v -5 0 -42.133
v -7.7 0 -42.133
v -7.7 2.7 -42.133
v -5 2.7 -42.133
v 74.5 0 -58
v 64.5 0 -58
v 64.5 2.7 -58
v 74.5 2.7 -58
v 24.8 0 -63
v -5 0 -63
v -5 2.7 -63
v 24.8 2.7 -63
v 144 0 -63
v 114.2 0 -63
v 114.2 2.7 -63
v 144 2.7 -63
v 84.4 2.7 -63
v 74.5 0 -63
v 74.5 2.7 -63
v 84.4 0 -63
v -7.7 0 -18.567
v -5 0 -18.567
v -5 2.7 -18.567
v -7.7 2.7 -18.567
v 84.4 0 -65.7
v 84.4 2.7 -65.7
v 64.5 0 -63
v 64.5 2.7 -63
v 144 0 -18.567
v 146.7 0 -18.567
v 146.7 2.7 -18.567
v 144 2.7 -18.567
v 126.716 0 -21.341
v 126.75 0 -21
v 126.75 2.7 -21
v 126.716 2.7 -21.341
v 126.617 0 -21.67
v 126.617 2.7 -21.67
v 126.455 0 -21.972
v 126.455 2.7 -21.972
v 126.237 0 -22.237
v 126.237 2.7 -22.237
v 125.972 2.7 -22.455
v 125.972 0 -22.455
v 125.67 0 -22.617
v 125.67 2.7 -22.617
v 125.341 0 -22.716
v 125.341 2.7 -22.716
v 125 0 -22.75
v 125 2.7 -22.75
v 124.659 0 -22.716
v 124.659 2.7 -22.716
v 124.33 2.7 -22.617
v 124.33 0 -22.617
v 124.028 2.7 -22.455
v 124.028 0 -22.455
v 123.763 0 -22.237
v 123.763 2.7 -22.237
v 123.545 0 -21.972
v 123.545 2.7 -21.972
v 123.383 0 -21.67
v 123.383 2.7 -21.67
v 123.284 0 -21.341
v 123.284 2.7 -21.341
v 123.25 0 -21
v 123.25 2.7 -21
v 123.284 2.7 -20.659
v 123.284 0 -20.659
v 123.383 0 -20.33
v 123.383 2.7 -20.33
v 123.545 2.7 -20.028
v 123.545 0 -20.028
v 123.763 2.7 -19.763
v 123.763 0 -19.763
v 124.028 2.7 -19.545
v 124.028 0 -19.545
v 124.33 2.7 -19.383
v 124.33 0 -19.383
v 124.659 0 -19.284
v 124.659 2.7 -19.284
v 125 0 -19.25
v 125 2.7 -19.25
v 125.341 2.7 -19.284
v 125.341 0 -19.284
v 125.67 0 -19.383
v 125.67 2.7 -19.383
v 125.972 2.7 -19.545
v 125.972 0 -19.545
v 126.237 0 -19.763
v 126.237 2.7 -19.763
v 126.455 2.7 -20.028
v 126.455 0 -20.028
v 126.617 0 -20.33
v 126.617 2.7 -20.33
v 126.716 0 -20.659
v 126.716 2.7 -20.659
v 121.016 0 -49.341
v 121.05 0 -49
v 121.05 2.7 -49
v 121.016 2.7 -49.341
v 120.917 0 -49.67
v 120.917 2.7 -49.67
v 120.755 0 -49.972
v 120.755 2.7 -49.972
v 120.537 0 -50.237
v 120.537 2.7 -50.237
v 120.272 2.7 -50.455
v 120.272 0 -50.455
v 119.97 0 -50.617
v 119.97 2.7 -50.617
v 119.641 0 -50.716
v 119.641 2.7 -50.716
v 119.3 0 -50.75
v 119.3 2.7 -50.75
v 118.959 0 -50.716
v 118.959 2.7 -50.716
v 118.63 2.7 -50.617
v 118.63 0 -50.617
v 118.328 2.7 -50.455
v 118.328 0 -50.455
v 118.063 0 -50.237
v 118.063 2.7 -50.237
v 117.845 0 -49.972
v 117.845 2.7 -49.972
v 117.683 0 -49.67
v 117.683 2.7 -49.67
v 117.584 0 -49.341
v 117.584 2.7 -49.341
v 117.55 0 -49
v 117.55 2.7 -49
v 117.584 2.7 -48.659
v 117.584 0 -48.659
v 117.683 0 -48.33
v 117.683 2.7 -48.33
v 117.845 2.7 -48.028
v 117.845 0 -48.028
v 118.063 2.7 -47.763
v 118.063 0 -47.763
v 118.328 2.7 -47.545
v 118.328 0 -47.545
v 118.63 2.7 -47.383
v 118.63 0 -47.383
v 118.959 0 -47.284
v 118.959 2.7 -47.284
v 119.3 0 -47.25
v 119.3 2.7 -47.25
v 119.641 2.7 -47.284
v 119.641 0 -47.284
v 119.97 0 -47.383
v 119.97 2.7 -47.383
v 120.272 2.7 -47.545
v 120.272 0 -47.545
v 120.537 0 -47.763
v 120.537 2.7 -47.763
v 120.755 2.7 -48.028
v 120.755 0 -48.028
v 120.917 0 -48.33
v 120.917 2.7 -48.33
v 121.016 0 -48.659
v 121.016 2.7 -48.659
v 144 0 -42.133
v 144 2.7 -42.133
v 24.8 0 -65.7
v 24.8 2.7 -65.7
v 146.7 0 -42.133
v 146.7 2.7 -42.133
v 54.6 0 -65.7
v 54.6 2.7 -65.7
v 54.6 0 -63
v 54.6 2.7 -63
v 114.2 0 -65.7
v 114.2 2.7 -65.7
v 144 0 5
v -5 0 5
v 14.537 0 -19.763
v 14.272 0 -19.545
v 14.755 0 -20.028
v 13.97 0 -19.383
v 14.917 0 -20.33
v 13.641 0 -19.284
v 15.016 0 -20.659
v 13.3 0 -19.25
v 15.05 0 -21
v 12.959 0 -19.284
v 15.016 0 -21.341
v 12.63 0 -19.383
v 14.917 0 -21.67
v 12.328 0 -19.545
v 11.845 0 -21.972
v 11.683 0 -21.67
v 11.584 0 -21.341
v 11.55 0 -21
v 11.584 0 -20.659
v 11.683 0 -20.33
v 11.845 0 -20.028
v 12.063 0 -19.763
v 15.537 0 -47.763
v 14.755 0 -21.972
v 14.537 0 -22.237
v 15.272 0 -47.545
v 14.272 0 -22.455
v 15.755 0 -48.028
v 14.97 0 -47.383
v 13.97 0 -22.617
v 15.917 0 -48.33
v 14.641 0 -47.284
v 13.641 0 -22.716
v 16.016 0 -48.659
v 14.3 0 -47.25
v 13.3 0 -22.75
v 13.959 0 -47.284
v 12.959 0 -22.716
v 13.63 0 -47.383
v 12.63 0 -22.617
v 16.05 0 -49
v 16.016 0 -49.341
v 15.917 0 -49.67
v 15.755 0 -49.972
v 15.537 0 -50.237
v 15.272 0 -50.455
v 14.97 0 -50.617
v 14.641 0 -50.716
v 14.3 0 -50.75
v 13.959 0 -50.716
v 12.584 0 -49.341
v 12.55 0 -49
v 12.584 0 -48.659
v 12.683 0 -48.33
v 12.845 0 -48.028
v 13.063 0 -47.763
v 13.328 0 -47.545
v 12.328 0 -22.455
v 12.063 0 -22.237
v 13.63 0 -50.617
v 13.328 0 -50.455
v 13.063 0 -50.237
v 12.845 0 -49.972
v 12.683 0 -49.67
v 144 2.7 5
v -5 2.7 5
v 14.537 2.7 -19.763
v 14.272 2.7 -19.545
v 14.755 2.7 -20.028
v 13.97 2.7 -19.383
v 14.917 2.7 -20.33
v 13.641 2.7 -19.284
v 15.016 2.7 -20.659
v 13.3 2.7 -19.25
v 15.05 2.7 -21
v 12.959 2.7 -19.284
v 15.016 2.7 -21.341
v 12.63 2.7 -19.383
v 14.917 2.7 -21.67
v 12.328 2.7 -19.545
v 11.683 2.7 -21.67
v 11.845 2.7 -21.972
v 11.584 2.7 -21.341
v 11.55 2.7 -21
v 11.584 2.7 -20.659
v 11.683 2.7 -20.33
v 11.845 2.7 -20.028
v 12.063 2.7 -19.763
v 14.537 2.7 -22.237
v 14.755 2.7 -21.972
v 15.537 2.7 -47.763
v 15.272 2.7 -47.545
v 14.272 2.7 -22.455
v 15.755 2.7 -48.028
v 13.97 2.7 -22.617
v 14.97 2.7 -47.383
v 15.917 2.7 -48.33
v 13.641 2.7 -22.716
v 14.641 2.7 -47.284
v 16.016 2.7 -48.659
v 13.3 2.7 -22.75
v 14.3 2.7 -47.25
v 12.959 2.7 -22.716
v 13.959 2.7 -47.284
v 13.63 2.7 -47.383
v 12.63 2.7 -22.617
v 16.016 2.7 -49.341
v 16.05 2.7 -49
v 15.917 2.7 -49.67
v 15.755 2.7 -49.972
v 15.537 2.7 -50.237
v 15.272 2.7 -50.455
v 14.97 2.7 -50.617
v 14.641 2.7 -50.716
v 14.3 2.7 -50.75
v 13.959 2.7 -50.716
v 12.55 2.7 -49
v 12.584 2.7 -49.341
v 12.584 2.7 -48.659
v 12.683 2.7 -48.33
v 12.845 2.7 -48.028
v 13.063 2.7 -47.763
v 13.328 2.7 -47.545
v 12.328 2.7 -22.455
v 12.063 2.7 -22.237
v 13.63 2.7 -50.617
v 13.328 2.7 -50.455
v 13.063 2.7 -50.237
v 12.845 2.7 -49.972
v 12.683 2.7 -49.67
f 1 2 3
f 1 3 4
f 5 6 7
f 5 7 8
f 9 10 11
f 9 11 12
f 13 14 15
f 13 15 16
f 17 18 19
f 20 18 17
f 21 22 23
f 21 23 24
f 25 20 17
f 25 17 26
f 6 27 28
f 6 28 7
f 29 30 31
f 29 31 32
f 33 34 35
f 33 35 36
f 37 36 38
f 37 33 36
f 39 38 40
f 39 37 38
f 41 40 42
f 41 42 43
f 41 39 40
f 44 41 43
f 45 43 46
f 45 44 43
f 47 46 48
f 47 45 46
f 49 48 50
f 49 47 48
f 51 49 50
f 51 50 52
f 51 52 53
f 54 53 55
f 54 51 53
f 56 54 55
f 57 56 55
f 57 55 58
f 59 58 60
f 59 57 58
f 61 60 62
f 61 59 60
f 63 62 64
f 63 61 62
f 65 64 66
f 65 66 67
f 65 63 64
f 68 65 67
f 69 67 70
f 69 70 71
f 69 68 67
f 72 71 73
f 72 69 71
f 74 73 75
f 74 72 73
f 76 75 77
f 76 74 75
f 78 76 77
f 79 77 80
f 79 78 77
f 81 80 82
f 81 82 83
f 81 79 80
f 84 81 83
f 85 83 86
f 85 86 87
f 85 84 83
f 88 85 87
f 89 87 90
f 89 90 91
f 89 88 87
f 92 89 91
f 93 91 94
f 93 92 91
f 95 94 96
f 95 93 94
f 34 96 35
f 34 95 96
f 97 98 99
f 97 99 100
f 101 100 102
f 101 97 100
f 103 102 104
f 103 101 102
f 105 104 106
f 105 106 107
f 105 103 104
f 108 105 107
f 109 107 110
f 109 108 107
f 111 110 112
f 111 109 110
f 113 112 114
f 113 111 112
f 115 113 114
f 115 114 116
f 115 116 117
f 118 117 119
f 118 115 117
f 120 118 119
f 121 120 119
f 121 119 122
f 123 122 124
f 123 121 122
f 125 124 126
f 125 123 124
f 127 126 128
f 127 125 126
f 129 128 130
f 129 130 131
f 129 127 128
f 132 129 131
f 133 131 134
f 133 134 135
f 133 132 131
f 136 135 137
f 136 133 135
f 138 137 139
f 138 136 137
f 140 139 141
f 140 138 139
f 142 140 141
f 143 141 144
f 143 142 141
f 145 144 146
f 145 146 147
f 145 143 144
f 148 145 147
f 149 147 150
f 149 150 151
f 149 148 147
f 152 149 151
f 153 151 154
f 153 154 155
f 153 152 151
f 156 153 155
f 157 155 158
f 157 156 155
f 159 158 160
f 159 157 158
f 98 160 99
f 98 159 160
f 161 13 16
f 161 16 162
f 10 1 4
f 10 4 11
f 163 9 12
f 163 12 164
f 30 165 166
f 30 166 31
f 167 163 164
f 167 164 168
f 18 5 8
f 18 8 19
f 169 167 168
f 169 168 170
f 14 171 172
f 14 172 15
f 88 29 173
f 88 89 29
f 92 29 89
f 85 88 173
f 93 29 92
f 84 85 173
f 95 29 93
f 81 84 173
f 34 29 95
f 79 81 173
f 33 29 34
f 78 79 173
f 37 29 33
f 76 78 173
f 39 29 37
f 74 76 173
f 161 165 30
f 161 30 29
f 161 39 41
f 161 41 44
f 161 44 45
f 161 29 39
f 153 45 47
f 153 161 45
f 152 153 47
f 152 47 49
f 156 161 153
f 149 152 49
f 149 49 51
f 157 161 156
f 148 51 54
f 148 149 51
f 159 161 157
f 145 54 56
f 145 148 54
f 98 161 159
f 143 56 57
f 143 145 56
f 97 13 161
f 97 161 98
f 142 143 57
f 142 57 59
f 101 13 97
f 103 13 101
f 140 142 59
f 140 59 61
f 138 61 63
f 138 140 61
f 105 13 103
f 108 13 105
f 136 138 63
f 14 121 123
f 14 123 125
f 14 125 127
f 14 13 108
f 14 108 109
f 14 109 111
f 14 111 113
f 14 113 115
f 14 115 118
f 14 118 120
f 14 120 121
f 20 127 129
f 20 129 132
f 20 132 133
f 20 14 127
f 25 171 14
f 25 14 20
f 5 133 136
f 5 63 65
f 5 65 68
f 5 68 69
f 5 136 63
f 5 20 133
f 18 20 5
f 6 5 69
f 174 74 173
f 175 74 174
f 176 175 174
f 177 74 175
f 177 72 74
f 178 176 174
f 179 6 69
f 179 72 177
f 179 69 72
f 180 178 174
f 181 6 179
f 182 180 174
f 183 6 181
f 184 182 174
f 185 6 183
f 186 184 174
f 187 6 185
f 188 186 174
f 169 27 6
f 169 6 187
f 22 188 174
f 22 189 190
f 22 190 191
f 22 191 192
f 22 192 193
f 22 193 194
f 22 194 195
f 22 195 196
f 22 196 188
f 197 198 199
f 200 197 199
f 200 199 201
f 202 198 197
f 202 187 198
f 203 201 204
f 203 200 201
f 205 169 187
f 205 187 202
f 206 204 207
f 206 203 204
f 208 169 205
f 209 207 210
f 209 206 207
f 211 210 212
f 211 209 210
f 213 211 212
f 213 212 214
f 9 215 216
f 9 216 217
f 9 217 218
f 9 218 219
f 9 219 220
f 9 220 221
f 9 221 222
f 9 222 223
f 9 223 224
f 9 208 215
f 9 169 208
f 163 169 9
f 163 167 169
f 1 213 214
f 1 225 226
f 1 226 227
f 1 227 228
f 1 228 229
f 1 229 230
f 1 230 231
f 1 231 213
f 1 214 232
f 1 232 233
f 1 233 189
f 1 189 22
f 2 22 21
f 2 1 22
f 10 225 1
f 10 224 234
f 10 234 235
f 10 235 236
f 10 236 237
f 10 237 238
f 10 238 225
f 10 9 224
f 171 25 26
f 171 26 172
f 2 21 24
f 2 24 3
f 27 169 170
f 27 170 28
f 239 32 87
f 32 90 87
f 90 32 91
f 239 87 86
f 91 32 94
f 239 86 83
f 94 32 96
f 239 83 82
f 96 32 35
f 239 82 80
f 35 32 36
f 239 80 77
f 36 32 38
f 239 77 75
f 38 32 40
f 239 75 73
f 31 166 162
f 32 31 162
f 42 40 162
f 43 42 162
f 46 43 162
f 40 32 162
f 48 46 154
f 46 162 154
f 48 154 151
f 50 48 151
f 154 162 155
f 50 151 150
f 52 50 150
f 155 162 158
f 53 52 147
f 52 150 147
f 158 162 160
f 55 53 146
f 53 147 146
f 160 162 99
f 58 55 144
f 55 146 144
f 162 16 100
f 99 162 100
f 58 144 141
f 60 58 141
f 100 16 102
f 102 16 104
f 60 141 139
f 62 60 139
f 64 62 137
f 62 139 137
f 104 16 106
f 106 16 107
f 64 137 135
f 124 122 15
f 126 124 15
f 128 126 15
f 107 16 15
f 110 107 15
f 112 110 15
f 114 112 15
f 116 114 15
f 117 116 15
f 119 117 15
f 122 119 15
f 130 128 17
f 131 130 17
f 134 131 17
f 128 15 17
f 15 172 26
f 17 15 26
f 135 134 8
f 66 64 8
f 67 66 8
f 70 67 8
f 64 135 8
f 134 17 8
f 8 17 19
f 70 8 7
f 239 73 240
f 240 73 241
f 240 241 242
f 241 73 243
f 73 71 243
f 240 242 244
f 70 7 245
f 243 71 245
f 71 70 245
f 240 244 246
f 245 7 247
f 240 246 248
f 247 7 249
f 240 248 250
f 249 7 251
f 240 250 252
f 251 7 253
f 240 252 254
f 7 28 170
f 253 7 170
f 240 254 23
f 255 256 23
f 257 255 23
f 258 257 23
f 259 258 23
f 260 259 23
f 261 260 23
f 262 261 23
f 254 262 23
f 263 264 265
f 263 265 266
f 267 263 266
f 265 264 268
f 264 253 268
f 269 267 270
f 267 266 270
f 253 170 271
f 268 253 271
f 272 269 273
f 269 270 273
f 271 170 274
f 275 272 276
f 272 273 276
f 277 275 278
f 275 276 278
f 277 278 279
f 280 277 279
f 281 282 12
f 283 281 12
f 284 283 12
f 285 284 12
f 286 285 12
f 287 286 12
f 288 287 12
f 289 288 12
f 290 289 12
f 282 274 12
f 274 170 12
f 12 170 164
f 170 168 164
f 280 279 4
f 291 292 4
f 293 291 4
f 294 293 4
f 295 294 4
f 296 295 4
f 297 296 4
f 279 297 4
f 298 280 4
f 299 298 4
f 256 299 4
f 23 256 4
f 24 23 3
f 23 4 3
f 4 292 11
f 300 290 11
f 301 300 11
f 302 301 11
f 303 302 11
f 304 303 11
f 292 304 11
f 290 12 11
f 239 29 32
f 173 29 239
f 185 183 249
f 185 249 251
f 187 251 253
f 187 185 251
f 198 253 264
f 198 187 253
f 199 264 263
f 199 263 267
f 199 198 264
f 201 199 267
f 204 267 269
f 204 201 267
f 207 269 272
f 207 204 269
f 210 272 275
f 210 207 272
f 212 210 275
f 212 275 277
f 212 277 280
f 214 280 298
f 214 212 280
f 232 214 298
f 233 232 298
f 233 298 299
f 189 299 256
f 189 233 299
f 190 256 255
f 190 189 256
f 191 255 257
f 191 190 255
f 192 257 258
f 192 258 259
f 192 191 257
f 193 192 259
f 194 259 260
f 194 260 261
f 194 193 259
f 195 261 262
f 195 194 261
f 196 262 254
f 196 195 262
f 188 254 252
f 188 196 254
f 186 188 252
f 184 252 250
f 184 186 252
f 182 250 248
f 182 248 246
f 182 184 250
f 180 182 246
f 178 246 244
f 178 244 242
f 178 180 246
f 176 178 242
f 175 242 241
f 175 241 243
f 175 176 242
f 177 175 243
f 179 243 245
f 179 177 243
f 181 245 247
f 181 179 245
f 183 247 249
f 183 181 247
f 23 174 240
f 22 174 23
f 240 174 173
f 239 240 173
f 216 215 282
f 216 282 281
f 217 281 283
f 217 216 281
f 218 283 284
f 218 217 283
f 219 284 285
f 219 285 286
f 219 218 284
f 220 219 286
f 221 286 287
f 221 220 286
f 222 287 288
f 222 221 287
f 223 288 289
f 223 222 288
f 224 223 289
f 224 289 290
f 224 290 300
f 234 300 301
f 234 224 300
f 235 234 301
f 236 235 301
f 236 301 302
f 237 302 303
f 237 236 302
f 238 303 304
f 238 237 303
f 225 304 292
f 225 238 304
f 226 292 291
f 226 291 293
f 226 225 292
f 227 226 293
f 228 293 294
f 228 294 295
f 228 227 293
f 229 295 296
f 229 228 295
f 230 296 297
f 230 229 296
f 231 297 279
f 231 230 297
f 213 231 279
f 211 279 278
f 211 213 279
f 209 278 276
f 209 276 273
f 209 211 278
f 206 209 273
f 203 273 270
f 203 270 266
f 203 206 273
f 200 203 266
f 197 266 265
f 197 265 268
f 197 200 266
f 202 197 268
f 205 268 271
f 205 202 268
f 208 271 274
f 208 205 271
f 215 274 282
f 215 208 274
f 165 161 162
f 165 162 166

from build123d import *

# Parameters (mm, degrees)
SKETCH1_R           = 1.75
BOSS_EXTRUDE1_DEPTH = 2.7


with BuildPart() as part:
    # Sketch1 → Boss-Extrude1 (new body)
    with BuildSketch(Plane(origin=(0, 0, 0), x_dir=(1, 0, 0), z_dir=(0, 1, 0))):
        Polygon((64.5, 63), (64.5, 58), (74.5, 58), (74.5, 63), (84.4, 63), (84.4, 65.7), (114.2, 65.7), (114.2, 63), (144, 63), (144, 42.133333333), (146.7, 42.133333333), (146.7, 18.566666667), (144, 18.566666667), (144, -5), (115.82, -5), (84.94, -5), (74.5, -5), (64.5, -5), (54.06, -5), (23.18, -5), (-5, -5), (-5, 18.566666667), (-7.7, 18.566666667), (-7.7, 42.133333333), (-5, 42.133333333), (-5, 63), (24.8, 63), (24.8, 65.7), (54.6, 65.7), (54.6, 63), align=None)
        with Locations((13.3, 21)):
            Circle(SKETCH1_R, mode=Mode.SUBTRACT)
        with Locations((14.3, 49)):
            Circle(SKETCH1_R, mode=Mode.SUBTRACT)
        with Locations((119.3, 49)):
            Circle(SKETCH1_R, mode=Mode.SUBTRACT)
        with Locations((125, 21)):
            Circle(SKETCH1_R, mode=Mode.SUBTRACT)
    extrude(amount=BOSS_EXTRUDE1_DEPTH)


solid = part.part
